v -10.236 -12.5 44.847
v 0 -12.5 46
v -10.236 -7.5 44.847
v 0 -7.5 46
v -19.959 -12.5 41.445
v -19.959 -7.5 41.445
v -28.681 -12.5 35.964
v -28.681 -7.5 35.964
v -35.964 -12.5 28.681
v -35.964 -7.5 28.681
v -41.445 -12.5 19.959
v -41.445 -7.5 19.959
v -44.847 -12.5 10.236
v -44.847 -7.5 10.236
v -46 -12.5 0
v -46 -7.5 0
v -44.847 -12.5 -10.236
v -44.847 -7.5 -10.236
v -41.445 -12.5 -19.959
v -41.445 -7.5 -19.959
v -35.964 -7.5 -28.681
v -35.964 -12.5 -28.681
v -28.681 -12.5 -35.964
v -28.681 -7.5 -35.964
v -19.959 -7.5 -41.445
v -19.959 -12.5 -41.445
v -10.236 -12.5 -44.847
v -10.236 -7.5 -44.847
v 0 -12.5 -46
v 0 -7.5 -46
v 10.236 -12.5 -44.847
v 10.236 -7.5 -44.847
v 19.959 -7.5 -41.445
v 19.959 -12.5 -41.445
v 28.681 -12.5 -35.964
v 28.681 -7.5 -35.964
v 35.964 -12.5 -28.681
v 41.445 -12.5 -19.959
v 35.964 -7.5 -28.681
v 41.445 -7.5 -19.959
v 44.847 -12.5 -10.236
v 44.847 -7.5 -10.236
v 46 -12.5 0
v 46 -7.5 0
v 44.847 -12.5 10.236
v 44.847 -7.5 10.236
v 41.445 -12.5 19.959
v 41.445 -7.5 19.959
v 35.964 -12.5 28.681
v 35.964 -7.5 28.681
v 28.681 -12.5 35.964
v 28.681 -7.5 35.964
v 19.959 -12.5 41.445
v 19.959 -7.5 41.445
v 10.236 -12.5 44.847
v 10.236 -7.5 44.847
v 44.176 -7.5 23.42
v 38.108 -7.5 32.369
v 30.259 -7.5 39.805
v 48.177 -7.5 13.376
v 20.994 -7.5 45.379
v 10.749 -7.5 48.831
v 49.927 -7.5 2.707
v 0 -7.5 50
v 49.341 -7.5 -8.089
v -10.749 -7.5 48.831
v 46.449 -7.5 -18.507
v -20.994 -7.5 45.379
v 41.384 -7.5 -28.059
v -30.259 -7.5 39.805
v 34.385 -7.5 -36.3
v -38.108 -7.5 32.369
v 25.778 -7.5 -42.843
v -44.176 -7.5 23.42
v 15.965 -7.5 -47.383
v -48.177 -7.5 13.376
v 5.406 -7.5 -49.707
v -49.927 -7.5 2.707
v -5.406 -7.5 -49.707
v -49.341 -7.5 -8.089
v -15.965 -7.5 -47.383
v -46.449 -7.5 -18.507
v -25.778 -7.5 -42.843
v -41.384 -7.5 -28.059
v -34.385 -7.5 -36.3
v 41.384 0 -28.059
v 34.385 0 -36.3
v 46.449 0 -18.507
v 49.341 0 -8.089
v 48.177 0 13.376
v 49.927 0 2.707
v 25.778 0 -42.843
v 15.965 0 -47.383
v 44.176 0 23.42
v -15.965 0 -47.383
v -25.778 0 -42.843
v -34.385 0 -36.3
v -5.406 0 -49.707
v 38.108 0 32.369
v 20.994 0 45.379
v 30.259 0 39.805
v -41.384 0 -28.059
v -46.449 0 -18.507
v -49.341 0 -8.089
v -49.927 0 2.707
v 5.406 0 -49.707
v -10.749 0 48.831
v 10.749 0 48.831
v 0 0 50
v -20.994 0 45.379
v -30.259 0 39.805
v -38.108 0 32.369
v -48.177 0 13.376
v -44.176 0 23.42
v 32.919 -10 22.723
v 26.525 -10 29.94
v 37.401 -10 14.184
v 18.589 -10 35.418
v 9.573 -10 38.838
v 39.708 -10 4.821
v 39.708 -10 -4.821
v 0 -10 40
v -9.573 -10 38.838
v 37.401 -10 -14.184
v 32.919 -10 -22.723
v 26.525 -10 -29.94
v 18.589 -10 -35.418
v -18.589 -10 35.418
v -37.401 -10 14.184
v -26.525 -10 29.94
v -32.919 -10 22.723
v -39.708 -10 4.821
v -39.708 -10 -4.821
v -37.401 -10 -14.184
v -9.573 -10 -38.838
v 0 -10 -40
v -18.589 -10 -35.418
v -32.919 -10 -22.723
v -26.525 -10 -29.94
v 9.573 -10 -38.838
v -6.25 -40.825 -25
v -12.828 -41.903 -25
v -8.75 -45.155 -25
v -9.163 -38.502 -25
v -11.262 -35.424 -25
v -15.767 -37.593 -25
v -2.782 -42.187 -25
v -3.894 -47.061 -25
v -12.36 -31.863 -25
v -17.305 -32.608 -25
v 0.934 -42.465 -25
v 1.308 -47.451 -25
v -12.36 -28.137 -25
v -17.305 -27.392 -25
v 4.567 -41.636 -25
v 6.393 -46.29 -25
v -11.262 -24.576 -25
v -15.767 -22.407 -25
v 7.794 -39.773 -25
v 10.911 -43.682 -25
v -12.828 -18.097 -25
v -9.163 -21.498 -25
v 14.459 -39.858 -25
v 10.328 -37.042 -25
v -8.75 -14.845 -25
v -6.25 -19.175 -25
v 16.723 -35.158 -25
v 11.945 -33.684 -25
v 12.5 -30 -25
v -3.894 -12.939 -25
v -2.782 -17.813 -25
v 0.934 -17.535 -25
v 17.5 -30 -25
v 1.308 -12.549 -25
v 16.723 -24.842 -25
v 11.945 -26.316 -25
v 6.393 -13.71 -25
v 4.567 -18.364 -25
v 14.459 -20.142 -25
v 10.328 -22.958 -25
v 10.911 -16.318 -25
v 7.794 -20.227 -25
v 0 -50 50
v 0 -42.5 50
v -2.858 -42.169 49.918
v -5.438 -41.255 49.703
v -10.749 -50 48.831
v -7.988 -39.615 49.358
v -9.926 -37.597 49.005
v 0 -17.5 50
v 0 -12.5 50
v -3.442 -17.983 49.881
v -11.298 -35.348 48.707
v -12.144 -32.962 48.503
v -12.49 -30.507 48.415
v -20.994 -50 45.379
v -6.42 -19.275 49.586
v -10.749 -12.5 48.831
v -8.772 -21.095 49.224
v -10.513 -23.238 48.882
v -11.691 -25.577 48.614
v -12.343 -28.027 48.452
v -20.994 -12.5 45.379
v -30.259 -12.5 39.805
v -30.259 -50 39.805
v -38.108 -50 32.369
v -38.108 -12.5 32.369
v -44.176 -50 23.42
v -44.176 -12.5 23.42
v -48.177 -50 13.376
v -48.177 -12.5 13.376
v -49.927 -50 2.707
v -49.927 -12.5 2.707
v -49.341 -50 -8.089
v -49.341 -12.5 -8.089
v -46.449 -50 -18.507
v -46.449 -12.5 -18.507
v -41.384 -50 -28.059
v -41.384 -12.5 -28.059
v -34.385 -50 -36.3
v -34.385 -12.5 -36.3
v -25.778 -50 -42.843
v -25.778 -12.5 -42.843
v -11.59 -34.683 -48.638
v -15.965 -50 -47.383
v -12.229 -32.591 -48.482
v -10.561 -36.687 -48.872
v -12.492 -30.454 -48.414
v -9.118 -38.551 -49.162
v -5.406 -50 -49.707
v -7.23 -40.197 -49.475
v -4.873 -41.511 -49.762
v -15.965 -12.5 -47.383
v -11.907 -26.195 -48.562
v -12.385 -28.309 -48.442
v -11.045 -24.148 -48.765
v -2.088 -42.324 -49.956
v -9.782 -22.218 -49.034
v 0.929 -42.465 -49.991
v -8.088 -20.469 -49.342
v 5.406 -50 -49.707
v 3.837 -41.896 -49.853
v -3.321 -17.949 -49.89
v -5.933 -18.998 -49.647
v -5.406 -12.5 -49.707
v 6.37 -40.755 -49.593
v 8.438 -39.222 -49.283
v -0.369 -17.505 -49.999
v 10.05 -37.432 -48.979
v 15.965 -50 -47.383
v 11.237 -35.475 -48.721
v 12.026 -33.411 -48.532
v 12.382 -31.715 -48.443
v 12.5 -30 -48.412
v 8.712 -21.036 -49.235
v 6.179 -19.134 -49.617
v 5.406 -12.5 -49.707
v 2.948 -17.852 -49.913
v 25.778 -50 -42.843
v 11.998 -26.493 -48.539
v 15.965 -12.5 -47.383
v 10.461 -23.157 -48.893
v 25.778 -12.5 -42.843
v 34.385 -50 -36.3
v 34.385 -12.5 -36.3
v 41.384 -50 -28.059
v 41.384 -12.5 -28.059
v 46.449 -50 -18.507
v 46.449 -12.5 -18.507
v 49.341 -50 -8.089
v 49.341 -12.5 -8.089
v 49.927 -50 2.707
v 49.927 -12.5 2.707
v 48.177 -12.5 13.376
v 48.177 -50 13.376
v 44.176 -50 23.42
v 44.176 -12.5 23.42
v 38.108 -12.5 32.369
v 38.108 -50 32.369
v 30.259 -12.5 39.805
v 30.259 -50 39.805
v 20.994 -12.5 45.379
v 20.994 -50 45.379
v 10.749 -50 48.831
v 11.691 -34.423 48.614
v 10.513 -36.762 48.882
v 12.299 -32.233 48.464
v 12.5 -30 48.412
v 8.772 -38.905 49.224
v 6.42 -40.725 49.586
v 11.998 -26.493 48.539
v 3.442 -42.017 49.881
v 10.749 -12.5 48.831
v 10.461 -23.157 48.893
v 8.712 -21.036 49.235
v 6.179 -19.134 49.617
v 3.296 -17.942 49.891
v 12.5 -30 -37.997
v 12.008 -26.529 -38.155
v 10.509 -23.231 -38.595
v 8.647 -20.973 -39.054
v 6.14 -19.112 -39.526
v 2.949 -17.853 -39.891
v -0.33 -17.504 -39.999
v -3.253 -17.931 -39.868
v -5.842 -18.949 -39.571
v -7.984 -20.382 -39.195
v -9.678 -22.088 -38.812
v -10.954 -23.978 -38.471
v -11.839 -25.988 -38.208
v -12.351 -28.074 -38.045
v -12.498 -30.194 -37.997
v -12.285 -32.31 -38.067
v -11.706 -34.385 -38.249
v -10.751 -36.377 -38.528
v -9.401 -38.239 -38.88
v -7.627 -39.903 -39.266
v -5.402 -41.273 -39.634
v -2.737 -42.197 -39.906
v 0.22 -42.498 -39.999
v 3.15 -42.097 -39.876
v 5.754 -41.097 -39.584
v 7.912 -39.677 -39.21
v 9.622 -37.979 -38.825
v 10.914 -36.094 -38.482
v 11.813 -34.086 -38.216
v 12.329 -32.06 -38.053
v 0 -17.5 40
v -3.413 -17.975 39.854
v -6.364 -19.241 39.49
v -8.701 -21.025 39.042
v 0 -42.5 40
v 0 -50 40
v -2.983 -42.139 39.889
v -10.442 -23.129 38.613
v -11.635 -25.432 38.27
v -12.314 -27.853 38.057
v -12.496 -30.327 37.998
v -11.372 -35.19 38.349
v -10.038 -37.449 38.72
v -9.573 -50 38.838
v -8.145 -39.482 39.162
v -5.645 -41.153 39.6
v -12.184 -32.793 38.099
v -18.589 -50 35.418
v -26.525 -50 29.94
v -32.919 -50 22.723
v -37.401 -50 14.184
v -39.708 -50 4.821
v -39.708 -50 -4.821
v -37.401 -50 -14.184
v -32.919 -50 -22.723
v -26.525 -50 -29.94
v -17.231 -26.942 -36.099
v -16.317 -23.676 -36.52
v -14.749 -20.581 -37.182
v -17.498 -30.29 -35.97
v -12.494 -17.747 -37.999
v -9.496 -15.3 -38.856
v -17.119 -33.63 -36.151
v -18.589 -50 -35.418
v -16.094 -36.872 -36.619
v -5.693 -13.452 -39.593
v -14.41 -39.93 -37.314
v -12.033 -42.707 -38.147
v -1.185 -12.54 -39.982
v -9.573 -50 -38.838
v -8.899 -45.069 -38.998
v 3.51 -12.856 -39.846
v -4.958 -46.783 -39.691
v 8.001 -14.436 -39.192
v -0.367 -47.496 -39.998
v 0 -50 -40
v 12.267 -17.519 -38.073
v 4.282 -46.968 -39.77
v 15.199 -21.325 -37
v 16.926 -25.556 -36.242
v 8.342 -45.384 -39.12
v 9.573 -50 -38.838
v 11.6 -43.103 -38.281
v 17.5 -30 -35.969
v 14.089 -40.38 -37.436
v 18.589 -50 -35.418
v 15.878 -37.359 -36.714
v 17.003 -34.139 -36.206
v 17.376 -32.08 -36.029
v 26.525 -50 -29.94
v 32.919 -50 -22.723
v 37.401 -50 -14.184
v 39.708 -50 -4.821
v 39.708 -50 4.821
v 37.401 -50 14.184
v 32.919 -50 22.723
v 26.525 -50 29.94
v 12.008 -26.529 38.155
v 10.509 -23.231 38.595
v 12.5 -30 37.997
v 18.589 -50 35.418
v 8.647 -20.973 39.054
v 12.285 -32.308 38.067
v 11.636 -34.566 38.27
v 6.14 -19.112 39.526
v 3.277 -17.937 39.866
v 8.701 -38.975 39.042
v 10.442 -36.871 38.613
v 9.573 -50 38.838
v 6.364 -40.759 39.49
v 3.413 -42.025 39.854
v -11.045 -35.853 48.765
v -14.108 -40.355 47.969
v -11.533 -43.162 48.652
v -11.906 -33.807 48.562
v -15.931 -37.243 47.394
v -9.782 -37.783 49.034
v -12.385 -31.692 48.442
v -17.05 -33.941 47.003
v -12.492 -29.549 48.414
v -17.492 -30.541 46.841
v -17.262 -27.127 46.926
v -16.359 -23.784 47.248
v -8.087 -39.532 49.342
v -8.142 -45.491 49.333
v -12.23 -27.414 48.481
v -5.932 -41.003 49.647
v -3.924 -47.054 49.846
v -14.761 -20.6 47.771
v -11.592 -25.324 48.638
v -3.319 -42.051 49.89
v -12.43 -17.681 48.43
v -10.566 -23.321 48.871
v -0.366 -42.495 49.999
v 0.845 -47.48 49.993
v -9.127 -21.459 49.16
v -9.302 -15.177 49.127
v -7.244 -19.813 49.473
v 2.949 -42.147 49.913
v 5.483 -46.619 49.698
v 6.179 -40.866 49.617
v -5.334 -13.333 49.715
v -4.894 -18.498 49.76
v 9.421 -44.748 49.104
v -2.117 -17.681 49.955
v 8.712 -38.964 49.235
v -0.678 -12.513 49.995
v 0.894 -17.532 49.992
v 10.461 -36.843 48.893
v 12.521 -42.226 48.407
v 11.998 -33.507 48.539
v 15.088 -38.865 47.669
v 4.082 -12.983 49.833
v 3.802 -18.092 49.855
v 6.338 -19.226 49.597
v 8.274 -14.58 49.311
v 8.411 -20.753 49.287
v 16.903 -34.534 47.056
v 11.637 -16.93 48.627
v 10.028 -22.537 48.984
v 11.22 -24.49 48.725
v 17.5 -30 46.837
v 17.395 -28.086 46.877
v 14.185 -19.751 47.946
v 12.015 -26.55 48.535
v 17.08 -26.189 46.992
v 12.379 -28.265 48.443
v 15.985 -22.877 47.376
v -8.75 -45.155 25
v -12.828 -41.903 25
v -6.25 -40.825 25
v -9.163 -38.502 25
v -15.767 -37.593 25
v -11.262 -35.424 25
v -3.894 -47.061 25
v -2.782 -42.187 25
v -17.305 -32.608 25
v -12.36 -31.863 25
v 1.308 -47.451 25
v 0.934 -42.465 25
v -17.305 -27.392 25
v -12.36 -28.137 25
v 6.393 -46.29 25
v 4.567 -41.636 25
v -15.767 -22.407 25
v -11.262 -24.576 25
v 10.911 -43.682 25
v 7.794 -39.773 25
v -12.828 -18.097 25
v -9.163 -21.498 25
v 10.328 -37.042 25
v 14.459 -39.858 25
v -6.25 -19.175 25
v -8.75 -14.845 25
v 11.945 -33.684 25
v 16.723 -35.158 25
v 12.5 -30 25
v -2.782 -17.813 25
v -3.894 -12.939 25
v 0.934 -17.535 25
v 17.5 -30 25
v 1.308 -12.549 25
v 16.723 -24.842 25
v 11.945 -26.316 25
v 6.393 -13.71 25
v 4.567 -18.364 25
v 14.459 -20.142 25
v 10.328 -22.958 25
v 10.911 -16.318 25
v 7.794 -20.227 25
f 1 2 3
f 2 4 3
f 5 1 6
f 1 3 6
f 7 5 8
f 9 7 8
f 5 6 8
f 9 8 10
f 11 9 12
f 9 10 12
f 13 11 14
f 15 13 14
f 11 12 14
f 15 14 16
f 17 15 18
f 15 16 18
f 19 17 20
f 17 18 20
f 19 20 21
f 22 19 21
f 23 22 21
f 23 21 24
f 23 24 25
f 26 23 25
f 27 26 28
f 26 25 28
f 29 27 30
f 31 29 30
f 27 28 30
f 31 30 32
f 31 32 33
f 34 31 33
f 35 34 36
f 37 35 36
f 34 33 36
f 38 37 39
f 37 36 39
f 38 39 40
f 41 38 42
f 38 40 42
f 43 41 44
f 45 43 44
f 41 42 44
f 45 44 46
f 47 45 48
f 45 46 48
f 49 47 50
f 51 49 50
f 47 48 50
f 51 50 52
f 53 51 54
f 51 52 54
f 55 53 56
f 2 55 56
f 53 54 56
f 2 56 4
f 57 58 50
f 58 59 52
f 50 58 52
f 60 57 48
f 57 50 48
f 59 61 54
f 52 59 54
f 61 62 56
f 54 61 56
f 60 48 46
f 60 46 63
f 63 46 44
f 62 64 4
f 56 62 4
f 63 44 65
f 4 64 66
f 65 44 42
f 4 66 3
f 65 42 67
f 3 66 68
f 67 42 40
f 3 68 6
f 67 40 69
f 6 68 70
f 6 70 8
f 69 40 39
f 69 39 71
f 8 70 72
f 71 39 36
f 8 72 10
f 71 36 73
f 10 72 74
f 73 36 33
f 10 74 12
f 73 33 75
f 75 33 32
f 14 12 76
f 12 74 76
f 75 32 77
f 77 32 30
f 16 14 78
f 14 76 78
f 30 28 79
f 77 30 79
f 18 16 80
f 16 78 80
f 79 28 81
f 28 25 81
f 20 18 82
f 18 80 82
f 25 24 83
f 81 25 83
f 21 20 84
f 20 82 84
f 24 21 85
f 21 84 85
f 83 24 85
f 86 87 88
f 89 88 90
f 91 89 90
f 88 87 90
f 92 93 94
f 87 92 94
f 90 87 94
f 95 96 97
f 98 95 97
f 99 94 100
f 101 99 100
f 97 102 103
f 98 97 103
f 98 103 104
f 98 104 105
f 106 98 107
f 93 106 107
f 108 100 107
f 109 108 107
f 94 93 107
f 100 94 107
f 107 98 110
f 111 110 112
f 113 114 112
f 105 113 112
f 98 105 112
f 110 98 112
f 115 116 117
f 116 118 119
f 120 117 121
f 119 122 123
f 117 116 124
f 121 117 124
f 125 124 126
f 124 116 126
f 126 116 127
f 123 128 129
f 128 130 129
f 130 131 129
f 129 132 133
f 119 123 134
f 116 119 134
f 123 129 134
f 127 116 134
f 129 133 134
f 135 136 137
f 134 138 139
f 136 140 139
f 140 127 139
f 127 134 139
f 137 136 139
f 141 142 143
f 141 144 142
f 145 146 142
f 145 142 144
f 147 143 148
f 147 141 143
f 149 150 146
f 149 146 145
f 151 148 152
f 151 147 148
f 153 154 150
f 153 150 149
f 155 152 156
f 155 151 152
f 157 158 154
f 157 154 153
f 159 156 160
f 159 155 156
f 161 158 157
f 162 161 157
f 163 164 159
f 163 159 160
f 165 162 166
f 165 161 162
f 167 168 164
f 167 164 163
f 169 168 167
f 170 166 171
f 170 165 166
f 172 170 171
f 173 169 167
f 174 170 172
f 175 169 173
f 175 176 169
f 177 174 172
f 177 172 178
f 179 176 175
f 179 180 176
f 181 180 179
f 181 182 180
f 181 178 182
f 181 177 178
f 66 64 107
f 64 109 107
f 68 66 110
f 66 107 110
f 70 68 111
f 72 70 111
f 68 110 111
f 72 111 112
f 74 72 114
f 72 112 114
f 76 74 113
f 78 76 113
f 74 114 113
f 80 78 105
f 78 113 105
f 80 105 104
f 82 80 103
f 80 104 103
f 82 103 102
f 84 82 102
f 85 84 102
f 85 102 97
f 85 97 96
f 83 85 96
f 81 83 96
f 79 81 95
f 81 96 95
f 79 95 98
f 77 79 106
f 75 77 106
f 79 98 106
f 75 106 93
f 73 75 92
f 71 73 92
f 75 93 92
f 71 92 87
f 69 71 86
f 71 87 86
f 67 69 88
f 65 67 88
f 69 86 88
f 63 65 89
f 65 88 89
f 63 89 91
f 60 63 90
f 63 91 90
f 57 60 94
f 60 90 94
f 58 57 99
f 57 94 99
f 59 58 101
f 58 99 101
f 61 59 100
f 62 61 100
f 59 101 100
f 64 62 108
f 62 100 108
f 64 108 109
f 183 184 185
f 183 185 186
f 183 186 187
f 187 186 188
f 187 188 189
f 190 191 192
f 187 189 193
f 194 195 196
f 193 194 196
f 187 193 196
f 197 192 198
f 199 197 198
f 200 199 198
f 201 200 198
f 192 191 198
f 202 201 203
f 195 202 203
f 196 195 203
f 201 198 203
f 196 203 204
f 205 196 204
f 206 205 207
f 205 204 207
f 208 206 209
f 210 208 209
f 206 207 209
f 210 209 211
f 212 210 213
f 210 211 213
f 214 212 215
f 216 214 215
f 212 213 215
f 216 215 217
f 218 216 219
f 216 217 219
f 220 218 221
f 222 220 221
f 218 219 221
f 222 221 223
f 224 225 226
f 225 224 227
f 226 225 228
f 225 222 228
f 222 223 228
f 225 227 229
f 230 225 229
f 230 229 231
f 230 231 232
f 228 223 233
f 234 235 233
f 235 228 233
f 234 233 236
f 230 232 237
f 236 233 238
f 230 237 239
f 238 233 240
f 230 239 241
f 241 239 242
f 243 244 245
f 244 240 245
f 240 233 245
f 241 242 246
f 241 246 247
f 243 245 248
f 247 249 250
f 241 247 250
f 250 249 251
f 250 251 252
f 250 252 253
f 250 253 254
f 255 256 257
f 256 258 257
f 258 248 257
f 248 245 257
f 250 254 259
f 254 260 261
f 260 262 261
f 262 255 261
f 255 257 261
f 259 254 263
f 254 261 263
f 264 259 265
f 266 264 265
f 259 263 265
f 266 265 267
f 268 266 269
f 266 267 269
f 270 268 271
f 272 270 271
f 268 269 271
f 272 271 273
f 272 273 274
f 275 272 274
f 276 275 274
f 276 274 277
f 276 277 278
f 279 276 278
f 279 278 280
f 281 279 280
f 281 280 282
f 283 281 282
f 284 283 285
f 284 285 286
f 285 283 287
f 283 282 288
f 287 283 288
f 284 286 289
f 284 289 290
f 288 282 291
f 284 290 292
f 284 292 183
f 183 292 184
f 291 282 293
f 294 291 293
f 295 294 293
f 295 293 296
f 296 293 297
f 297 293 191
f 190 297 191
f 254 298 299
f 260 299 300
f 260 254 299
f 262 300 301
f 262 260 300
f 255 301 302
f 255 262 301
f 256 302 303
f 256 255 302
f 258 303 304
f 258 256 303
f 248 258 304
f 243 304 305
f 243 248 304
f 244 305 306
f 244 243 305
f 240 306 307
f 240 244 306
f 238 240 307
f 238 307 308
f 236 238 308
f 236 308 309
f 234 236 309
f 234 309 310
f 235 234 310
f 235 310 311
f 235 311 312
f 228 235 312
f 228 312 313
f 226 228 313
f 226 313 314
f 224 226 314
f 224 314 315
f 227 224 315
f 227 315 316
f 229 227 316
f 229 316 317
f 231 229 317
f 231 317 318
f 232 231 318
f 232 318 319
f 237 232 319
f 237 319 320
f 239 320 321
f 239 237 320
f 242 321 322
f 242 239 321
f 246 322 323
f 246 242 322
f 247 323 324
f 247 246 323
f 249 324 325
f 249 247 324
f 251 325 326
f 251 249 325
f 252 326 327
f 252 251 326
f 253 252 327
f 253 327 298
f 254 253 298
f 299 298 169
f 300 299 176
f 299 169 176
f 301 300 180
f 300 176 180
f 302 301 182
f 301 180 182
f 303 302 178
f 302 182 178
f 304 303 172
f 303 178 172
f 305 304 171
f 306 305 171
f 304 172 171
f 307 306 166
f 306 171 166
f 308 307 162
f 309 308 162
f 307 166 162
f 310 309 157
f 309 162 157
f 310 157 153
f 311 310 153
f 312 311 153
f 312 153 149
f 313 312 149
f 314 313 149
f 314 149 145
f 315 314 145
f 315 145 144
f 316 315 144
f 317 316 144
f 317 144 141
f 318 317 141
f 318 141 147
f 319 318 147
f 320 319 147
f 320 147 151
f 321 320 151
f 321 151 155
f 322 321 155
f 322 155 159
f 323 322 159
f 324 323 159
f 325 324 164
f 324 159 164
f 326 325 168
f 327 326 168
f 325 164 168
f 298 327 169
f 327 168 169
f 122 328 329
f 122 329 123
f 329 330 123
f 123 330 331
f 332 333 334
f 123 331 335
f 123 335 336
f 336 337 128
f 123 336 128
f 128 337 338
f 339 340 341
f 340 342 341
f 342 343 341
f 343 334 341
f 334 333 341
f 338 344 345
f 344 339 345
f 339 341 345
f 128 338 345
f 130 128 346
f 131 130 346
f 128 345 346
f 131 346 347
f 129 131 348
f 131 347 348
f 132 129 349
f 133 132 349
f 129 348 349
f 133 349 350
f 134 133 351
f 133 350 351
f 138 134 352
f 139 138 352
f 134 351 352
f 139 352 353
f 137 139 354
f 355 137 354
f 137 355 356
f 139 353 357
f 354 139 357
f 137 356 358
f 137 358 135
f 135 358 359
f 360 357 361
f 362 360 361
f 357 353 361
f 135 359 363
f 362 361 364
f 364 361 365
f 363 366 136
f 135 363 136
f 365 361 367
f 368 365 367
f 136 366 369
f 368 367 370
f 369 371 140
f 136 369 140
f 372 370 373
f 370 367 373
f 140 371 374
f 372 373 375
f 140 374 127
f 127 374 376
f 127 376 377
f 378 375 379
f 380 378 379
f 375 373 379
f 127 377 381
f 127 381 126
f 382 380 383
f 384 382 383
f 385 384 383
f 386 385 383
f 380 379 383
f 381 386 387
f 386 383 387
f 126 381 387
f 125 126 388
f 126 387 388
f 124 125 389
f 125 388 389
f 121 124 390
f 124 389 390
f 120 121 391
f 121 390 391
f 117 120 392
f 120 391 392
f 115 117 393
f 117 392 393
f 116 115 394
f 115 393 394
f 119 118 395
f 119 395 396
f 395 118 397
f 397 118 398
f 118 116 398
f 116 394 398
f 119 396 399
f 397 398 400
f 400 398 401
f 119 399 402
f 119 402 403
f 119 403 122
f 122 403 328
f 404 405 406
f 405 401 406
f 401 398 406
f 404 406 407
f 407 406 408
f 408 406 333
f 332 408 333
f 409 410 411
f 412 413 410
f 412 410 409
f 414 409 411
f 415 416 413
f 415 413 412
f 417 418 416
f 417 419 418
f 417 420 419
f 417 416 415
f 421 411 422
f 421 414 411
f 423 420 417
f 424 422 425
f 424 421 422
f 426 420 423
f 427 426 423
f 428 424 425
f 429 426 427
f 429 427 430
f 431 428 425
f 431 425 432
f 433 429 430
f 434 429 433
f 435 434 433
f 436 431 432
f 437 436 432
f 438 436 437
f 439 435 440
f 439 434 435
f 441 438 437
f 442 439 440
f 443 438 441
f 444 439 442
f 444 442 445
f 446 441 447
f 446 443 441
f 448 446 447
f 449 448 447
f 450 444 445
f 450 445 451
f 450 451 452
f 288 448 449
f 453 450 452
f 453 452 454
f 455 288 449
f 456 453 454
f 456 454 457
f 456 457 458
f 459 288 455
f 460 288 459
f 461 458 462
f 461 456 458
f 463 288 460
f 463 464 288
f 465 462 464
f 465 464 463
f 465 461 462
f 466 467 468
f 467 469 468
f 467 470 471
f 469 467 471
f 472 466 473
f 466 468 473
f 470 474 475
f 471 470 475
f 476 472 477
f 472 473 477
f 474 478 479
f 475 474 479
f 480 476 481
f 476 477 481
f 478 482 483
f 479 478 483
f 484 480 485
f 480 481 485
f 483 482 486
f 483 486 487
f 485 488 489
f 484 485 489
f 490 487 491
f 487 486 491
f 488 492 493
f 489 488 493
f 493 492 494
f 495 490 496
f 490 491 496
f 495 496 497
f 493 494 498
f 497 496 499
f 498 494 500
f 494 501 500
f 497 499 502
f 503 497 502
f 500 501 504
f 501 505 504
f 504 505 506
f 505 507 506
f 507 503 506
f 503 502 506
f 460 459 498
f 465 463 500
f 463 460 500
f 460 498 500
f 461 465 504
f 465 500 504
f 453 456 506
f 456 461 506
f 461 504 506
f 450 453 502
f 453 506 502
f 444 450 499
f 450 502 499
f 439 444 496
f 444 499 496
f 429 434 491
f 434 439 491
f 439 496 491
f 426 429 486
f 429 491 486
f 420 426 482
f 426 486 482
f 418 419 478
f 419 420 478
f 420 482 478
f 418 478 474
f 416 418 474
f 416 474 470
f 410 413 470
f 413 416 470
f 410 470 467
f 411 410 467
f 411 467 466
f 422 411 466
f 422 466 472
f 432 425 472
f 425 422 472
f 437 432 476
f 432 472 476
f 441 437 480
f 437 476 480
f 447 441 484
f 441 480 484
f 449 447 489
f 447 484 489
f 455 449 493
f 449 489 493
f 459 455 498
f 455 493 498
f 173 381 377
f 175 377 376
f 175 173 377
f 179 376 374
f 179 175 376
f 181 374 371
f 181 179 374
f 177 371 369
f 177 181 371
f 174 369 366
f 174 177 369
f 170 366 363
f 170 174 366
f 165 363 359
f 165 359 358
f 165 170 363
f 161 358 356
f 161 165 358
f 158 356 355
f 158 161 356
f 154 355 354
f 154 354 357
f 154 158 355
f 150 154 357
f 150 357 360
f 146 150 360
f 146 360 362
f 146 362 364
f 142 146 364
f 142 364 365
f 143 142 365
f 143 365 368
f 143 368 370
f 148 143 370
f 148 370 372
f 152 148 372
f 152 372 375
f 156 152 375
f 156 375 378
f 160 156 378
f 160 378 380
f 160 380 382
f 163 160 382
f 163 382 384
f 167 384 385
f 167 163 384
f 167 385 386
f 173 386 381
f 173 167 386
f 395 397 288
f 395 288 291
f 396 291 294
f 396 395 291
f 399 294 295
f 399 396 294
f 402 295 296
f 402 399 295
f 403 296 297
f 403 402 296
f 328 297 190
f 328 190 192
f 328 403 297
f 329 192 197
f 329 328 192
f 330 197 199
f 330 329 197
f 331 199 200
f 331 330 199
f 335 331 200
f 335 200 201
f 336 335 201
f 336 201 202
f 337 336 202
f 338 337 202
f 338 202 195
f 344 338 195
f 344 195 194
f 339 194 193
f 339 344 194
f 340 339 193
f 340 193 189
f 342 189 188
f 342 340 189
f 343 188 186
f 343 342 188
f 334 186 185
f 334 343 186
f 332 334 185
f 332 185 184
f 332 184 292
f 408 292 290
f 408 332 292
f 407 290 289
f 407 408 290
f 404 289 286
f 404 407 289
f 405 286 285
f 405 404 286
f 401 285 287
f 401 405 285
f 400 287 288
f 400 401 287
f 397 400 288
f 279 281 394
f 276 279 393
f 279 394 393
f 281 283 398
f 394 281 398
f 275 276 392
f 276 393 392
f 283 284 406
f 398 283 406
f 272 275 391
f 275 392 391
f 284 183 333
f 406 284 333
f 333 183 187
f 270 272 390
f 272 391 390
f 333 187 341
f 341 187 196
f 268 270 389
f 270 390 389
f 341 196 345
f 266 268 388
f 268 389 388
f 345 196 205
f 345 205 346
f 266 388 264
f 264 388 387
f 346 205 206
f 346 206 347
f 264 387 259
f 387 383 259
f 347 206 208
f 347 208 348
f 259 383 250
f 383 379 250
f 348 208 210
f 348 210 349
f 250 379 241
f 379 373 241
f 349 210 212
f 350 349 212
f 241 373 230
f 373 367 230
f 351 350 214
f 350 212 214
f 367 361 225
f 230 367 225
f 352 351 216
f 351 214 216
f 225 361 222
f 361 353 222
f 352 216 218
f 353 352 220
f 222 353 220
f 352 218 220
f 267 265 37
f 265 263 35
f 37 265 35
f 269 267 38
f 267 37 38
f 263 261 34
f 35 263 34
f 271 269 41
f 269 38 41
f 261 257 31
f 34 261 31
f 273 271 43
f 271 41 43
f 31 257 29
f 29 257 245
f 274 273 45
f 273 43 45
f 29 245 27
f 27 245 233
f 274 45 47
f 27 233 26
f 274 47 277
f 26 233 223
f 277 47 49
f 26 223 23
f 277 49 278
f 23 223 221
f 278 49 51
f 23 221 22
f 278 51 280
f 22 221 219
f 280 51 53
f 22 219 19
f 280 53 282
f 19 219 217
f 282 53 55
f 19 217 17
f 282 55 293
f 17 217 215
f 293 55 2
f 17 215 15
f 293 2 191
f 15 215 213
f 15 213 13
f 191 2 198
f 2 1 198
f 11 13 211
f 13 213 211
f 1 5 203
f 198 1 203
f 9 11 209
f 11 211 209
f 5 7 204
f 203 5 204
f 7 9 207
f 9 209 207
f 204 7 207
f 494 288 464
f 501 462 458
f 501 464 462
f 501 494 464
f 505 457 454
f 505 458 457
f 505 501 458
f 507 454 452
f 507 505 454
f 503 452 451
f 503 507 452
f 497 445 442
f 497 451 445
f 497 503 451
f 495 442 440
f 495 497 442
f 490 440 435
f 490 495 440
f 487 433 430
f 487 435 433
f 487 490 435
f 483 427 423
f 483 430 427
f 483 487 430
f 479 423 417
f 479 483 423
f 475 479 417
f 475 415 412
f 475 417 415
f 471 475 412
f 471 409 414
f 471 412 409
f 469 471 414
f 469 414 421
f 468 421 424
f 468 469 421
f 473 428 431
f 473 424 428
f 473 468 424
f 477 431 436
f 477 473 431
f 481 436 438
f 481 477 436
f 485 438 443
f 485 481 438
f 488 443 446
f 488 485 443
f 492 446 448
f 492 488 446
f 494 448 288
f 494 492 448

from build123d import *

# Parameters (mm, degrees)
ENL_V_MAT_EXTRU_1_DEPTH      = 87.602540378
ENL_V_MAT_EXTRU_1_DEPTH_BACK = 87.602540378
ESQUISSE2_R                  = 12.5
EXTRU_MINCE1_REACH           = 113.603
EXTRU_MINCE1_END_RADIUS      = 50
EXTRU_MINCE1_START           = 25
ESQUISSE2_2_R                = 17.5
ESQUISSE2_2_R_2              = 12.5
EXTRU_MINCE2_REACH           = 113.603
EXTRU_MINCE2_END_RADIUS      = 50
EXTRU_MINCE2_START           = -25
ESQUISSE2_3_R                = 17.5
ESQUISSE2_3_R_2              = 12.5


with BuildPart() as part:
    # Esquisse1 → Révolution1 (revolve)
    with BuildSketch(Plane.XY):
        Polygon((50, 0), (0, 0), (0, -10), (40, -10), (40, -50), (50, -50), (50, -12.5), (46, -12.5), (46, -7.5), (50, -7.5), align=None)
    revolve(axis=Axis((0, 0, 0), (0, -1, 0)))

    # Esquisse2 → Enlèv. mat.-Extru.1 (cut, two sides: drawn at the far end of the back side and taken through both)
    with BuildSketch(Plane.XY.offset(-ENL_V_MAT_EXTRU_1_DEPTH_BACK)):
        with Locations((0, -30)):
            Circle(ESQUISSE2_R)
    extrude(amount=ENL_V_MAT_EXTRU_1_DEPTH + ENL_V_MAT_EXTRU_1_DEPTH_BACK, mode=Mode.SUBTRACT)

    # Extru.-Mince2: up to this cylinder (the profile starts inside it)
    extru_mince2_end = Plane(origin=(0, -30, 0), z_dir=(0, 1, 0)) * Cylinder(EXTRU_MINCE2_END_RADIUS, 328.206, mode=Mode.PRIVATE)
    # Esquisse2<3> → Extru.-Mince2 (add, up to the surface)
    with BuildSketch(Plane.XY.offset(EXTRU_MINCE2_START), mode=Mode.PRIVATE) as extru_mince2_sk1:
        with Locations((0, -30)):
            Circle(ESQUISSE2_3_R)
        with Locations((0, -30)):
            Circle(ESQUISSE2_3_R_2, mode=Mode.SUBTRACT)
    extru_mince2_tool1 = extrude(extru_mince2_sk1.sketch, amount=-EXTRU_MINCE2_REACH, mode=Mode.PRIVATE) & extru_mince2_end
    add(extru_mince2_tool1.solids().sort_by_distance((-17.005025, -30, -25))[0])


with BuildPart() as body_2:
    # Extru.-Mince1: up to this cylinder (the profile starts inside it)
    extru_mince1_end = Plane(origin=(0, -30, 0), z_dir=(0, 1, 0)) * Cylinder(EXTRU_MINCE1_END_RADIUS, 328.206, mode=Mode.PRIVATE)
    # Esquisse2<2> → Extru.-Mince1 (new, up to the surface)
    with BuildSketch(Plane.XY.offset(EXTRU_MINCE1_START), mode=Mode.PRIVATE) as extru_mince1_sk1:
        with Locations((0, -30)):
            Circle(ESQUISSE2_2_R)
        with Locations((0, -30)):
            Circle(ESQUISSE2_2_R_2, mode=Mode.SUBTRACT)
    extru_mince1_tool1 = extrude(extru_mince1_sk1.sketch, amount=EXTRU_MINCE1_REACH, mode=Mode.PRIVATE) & extru_mince1_end
    add(extru_mince1_tool1.solids().sort_by_distance((-17.005025, -30, 25))[0])


solid = Compound([part.part, body_2.part])
